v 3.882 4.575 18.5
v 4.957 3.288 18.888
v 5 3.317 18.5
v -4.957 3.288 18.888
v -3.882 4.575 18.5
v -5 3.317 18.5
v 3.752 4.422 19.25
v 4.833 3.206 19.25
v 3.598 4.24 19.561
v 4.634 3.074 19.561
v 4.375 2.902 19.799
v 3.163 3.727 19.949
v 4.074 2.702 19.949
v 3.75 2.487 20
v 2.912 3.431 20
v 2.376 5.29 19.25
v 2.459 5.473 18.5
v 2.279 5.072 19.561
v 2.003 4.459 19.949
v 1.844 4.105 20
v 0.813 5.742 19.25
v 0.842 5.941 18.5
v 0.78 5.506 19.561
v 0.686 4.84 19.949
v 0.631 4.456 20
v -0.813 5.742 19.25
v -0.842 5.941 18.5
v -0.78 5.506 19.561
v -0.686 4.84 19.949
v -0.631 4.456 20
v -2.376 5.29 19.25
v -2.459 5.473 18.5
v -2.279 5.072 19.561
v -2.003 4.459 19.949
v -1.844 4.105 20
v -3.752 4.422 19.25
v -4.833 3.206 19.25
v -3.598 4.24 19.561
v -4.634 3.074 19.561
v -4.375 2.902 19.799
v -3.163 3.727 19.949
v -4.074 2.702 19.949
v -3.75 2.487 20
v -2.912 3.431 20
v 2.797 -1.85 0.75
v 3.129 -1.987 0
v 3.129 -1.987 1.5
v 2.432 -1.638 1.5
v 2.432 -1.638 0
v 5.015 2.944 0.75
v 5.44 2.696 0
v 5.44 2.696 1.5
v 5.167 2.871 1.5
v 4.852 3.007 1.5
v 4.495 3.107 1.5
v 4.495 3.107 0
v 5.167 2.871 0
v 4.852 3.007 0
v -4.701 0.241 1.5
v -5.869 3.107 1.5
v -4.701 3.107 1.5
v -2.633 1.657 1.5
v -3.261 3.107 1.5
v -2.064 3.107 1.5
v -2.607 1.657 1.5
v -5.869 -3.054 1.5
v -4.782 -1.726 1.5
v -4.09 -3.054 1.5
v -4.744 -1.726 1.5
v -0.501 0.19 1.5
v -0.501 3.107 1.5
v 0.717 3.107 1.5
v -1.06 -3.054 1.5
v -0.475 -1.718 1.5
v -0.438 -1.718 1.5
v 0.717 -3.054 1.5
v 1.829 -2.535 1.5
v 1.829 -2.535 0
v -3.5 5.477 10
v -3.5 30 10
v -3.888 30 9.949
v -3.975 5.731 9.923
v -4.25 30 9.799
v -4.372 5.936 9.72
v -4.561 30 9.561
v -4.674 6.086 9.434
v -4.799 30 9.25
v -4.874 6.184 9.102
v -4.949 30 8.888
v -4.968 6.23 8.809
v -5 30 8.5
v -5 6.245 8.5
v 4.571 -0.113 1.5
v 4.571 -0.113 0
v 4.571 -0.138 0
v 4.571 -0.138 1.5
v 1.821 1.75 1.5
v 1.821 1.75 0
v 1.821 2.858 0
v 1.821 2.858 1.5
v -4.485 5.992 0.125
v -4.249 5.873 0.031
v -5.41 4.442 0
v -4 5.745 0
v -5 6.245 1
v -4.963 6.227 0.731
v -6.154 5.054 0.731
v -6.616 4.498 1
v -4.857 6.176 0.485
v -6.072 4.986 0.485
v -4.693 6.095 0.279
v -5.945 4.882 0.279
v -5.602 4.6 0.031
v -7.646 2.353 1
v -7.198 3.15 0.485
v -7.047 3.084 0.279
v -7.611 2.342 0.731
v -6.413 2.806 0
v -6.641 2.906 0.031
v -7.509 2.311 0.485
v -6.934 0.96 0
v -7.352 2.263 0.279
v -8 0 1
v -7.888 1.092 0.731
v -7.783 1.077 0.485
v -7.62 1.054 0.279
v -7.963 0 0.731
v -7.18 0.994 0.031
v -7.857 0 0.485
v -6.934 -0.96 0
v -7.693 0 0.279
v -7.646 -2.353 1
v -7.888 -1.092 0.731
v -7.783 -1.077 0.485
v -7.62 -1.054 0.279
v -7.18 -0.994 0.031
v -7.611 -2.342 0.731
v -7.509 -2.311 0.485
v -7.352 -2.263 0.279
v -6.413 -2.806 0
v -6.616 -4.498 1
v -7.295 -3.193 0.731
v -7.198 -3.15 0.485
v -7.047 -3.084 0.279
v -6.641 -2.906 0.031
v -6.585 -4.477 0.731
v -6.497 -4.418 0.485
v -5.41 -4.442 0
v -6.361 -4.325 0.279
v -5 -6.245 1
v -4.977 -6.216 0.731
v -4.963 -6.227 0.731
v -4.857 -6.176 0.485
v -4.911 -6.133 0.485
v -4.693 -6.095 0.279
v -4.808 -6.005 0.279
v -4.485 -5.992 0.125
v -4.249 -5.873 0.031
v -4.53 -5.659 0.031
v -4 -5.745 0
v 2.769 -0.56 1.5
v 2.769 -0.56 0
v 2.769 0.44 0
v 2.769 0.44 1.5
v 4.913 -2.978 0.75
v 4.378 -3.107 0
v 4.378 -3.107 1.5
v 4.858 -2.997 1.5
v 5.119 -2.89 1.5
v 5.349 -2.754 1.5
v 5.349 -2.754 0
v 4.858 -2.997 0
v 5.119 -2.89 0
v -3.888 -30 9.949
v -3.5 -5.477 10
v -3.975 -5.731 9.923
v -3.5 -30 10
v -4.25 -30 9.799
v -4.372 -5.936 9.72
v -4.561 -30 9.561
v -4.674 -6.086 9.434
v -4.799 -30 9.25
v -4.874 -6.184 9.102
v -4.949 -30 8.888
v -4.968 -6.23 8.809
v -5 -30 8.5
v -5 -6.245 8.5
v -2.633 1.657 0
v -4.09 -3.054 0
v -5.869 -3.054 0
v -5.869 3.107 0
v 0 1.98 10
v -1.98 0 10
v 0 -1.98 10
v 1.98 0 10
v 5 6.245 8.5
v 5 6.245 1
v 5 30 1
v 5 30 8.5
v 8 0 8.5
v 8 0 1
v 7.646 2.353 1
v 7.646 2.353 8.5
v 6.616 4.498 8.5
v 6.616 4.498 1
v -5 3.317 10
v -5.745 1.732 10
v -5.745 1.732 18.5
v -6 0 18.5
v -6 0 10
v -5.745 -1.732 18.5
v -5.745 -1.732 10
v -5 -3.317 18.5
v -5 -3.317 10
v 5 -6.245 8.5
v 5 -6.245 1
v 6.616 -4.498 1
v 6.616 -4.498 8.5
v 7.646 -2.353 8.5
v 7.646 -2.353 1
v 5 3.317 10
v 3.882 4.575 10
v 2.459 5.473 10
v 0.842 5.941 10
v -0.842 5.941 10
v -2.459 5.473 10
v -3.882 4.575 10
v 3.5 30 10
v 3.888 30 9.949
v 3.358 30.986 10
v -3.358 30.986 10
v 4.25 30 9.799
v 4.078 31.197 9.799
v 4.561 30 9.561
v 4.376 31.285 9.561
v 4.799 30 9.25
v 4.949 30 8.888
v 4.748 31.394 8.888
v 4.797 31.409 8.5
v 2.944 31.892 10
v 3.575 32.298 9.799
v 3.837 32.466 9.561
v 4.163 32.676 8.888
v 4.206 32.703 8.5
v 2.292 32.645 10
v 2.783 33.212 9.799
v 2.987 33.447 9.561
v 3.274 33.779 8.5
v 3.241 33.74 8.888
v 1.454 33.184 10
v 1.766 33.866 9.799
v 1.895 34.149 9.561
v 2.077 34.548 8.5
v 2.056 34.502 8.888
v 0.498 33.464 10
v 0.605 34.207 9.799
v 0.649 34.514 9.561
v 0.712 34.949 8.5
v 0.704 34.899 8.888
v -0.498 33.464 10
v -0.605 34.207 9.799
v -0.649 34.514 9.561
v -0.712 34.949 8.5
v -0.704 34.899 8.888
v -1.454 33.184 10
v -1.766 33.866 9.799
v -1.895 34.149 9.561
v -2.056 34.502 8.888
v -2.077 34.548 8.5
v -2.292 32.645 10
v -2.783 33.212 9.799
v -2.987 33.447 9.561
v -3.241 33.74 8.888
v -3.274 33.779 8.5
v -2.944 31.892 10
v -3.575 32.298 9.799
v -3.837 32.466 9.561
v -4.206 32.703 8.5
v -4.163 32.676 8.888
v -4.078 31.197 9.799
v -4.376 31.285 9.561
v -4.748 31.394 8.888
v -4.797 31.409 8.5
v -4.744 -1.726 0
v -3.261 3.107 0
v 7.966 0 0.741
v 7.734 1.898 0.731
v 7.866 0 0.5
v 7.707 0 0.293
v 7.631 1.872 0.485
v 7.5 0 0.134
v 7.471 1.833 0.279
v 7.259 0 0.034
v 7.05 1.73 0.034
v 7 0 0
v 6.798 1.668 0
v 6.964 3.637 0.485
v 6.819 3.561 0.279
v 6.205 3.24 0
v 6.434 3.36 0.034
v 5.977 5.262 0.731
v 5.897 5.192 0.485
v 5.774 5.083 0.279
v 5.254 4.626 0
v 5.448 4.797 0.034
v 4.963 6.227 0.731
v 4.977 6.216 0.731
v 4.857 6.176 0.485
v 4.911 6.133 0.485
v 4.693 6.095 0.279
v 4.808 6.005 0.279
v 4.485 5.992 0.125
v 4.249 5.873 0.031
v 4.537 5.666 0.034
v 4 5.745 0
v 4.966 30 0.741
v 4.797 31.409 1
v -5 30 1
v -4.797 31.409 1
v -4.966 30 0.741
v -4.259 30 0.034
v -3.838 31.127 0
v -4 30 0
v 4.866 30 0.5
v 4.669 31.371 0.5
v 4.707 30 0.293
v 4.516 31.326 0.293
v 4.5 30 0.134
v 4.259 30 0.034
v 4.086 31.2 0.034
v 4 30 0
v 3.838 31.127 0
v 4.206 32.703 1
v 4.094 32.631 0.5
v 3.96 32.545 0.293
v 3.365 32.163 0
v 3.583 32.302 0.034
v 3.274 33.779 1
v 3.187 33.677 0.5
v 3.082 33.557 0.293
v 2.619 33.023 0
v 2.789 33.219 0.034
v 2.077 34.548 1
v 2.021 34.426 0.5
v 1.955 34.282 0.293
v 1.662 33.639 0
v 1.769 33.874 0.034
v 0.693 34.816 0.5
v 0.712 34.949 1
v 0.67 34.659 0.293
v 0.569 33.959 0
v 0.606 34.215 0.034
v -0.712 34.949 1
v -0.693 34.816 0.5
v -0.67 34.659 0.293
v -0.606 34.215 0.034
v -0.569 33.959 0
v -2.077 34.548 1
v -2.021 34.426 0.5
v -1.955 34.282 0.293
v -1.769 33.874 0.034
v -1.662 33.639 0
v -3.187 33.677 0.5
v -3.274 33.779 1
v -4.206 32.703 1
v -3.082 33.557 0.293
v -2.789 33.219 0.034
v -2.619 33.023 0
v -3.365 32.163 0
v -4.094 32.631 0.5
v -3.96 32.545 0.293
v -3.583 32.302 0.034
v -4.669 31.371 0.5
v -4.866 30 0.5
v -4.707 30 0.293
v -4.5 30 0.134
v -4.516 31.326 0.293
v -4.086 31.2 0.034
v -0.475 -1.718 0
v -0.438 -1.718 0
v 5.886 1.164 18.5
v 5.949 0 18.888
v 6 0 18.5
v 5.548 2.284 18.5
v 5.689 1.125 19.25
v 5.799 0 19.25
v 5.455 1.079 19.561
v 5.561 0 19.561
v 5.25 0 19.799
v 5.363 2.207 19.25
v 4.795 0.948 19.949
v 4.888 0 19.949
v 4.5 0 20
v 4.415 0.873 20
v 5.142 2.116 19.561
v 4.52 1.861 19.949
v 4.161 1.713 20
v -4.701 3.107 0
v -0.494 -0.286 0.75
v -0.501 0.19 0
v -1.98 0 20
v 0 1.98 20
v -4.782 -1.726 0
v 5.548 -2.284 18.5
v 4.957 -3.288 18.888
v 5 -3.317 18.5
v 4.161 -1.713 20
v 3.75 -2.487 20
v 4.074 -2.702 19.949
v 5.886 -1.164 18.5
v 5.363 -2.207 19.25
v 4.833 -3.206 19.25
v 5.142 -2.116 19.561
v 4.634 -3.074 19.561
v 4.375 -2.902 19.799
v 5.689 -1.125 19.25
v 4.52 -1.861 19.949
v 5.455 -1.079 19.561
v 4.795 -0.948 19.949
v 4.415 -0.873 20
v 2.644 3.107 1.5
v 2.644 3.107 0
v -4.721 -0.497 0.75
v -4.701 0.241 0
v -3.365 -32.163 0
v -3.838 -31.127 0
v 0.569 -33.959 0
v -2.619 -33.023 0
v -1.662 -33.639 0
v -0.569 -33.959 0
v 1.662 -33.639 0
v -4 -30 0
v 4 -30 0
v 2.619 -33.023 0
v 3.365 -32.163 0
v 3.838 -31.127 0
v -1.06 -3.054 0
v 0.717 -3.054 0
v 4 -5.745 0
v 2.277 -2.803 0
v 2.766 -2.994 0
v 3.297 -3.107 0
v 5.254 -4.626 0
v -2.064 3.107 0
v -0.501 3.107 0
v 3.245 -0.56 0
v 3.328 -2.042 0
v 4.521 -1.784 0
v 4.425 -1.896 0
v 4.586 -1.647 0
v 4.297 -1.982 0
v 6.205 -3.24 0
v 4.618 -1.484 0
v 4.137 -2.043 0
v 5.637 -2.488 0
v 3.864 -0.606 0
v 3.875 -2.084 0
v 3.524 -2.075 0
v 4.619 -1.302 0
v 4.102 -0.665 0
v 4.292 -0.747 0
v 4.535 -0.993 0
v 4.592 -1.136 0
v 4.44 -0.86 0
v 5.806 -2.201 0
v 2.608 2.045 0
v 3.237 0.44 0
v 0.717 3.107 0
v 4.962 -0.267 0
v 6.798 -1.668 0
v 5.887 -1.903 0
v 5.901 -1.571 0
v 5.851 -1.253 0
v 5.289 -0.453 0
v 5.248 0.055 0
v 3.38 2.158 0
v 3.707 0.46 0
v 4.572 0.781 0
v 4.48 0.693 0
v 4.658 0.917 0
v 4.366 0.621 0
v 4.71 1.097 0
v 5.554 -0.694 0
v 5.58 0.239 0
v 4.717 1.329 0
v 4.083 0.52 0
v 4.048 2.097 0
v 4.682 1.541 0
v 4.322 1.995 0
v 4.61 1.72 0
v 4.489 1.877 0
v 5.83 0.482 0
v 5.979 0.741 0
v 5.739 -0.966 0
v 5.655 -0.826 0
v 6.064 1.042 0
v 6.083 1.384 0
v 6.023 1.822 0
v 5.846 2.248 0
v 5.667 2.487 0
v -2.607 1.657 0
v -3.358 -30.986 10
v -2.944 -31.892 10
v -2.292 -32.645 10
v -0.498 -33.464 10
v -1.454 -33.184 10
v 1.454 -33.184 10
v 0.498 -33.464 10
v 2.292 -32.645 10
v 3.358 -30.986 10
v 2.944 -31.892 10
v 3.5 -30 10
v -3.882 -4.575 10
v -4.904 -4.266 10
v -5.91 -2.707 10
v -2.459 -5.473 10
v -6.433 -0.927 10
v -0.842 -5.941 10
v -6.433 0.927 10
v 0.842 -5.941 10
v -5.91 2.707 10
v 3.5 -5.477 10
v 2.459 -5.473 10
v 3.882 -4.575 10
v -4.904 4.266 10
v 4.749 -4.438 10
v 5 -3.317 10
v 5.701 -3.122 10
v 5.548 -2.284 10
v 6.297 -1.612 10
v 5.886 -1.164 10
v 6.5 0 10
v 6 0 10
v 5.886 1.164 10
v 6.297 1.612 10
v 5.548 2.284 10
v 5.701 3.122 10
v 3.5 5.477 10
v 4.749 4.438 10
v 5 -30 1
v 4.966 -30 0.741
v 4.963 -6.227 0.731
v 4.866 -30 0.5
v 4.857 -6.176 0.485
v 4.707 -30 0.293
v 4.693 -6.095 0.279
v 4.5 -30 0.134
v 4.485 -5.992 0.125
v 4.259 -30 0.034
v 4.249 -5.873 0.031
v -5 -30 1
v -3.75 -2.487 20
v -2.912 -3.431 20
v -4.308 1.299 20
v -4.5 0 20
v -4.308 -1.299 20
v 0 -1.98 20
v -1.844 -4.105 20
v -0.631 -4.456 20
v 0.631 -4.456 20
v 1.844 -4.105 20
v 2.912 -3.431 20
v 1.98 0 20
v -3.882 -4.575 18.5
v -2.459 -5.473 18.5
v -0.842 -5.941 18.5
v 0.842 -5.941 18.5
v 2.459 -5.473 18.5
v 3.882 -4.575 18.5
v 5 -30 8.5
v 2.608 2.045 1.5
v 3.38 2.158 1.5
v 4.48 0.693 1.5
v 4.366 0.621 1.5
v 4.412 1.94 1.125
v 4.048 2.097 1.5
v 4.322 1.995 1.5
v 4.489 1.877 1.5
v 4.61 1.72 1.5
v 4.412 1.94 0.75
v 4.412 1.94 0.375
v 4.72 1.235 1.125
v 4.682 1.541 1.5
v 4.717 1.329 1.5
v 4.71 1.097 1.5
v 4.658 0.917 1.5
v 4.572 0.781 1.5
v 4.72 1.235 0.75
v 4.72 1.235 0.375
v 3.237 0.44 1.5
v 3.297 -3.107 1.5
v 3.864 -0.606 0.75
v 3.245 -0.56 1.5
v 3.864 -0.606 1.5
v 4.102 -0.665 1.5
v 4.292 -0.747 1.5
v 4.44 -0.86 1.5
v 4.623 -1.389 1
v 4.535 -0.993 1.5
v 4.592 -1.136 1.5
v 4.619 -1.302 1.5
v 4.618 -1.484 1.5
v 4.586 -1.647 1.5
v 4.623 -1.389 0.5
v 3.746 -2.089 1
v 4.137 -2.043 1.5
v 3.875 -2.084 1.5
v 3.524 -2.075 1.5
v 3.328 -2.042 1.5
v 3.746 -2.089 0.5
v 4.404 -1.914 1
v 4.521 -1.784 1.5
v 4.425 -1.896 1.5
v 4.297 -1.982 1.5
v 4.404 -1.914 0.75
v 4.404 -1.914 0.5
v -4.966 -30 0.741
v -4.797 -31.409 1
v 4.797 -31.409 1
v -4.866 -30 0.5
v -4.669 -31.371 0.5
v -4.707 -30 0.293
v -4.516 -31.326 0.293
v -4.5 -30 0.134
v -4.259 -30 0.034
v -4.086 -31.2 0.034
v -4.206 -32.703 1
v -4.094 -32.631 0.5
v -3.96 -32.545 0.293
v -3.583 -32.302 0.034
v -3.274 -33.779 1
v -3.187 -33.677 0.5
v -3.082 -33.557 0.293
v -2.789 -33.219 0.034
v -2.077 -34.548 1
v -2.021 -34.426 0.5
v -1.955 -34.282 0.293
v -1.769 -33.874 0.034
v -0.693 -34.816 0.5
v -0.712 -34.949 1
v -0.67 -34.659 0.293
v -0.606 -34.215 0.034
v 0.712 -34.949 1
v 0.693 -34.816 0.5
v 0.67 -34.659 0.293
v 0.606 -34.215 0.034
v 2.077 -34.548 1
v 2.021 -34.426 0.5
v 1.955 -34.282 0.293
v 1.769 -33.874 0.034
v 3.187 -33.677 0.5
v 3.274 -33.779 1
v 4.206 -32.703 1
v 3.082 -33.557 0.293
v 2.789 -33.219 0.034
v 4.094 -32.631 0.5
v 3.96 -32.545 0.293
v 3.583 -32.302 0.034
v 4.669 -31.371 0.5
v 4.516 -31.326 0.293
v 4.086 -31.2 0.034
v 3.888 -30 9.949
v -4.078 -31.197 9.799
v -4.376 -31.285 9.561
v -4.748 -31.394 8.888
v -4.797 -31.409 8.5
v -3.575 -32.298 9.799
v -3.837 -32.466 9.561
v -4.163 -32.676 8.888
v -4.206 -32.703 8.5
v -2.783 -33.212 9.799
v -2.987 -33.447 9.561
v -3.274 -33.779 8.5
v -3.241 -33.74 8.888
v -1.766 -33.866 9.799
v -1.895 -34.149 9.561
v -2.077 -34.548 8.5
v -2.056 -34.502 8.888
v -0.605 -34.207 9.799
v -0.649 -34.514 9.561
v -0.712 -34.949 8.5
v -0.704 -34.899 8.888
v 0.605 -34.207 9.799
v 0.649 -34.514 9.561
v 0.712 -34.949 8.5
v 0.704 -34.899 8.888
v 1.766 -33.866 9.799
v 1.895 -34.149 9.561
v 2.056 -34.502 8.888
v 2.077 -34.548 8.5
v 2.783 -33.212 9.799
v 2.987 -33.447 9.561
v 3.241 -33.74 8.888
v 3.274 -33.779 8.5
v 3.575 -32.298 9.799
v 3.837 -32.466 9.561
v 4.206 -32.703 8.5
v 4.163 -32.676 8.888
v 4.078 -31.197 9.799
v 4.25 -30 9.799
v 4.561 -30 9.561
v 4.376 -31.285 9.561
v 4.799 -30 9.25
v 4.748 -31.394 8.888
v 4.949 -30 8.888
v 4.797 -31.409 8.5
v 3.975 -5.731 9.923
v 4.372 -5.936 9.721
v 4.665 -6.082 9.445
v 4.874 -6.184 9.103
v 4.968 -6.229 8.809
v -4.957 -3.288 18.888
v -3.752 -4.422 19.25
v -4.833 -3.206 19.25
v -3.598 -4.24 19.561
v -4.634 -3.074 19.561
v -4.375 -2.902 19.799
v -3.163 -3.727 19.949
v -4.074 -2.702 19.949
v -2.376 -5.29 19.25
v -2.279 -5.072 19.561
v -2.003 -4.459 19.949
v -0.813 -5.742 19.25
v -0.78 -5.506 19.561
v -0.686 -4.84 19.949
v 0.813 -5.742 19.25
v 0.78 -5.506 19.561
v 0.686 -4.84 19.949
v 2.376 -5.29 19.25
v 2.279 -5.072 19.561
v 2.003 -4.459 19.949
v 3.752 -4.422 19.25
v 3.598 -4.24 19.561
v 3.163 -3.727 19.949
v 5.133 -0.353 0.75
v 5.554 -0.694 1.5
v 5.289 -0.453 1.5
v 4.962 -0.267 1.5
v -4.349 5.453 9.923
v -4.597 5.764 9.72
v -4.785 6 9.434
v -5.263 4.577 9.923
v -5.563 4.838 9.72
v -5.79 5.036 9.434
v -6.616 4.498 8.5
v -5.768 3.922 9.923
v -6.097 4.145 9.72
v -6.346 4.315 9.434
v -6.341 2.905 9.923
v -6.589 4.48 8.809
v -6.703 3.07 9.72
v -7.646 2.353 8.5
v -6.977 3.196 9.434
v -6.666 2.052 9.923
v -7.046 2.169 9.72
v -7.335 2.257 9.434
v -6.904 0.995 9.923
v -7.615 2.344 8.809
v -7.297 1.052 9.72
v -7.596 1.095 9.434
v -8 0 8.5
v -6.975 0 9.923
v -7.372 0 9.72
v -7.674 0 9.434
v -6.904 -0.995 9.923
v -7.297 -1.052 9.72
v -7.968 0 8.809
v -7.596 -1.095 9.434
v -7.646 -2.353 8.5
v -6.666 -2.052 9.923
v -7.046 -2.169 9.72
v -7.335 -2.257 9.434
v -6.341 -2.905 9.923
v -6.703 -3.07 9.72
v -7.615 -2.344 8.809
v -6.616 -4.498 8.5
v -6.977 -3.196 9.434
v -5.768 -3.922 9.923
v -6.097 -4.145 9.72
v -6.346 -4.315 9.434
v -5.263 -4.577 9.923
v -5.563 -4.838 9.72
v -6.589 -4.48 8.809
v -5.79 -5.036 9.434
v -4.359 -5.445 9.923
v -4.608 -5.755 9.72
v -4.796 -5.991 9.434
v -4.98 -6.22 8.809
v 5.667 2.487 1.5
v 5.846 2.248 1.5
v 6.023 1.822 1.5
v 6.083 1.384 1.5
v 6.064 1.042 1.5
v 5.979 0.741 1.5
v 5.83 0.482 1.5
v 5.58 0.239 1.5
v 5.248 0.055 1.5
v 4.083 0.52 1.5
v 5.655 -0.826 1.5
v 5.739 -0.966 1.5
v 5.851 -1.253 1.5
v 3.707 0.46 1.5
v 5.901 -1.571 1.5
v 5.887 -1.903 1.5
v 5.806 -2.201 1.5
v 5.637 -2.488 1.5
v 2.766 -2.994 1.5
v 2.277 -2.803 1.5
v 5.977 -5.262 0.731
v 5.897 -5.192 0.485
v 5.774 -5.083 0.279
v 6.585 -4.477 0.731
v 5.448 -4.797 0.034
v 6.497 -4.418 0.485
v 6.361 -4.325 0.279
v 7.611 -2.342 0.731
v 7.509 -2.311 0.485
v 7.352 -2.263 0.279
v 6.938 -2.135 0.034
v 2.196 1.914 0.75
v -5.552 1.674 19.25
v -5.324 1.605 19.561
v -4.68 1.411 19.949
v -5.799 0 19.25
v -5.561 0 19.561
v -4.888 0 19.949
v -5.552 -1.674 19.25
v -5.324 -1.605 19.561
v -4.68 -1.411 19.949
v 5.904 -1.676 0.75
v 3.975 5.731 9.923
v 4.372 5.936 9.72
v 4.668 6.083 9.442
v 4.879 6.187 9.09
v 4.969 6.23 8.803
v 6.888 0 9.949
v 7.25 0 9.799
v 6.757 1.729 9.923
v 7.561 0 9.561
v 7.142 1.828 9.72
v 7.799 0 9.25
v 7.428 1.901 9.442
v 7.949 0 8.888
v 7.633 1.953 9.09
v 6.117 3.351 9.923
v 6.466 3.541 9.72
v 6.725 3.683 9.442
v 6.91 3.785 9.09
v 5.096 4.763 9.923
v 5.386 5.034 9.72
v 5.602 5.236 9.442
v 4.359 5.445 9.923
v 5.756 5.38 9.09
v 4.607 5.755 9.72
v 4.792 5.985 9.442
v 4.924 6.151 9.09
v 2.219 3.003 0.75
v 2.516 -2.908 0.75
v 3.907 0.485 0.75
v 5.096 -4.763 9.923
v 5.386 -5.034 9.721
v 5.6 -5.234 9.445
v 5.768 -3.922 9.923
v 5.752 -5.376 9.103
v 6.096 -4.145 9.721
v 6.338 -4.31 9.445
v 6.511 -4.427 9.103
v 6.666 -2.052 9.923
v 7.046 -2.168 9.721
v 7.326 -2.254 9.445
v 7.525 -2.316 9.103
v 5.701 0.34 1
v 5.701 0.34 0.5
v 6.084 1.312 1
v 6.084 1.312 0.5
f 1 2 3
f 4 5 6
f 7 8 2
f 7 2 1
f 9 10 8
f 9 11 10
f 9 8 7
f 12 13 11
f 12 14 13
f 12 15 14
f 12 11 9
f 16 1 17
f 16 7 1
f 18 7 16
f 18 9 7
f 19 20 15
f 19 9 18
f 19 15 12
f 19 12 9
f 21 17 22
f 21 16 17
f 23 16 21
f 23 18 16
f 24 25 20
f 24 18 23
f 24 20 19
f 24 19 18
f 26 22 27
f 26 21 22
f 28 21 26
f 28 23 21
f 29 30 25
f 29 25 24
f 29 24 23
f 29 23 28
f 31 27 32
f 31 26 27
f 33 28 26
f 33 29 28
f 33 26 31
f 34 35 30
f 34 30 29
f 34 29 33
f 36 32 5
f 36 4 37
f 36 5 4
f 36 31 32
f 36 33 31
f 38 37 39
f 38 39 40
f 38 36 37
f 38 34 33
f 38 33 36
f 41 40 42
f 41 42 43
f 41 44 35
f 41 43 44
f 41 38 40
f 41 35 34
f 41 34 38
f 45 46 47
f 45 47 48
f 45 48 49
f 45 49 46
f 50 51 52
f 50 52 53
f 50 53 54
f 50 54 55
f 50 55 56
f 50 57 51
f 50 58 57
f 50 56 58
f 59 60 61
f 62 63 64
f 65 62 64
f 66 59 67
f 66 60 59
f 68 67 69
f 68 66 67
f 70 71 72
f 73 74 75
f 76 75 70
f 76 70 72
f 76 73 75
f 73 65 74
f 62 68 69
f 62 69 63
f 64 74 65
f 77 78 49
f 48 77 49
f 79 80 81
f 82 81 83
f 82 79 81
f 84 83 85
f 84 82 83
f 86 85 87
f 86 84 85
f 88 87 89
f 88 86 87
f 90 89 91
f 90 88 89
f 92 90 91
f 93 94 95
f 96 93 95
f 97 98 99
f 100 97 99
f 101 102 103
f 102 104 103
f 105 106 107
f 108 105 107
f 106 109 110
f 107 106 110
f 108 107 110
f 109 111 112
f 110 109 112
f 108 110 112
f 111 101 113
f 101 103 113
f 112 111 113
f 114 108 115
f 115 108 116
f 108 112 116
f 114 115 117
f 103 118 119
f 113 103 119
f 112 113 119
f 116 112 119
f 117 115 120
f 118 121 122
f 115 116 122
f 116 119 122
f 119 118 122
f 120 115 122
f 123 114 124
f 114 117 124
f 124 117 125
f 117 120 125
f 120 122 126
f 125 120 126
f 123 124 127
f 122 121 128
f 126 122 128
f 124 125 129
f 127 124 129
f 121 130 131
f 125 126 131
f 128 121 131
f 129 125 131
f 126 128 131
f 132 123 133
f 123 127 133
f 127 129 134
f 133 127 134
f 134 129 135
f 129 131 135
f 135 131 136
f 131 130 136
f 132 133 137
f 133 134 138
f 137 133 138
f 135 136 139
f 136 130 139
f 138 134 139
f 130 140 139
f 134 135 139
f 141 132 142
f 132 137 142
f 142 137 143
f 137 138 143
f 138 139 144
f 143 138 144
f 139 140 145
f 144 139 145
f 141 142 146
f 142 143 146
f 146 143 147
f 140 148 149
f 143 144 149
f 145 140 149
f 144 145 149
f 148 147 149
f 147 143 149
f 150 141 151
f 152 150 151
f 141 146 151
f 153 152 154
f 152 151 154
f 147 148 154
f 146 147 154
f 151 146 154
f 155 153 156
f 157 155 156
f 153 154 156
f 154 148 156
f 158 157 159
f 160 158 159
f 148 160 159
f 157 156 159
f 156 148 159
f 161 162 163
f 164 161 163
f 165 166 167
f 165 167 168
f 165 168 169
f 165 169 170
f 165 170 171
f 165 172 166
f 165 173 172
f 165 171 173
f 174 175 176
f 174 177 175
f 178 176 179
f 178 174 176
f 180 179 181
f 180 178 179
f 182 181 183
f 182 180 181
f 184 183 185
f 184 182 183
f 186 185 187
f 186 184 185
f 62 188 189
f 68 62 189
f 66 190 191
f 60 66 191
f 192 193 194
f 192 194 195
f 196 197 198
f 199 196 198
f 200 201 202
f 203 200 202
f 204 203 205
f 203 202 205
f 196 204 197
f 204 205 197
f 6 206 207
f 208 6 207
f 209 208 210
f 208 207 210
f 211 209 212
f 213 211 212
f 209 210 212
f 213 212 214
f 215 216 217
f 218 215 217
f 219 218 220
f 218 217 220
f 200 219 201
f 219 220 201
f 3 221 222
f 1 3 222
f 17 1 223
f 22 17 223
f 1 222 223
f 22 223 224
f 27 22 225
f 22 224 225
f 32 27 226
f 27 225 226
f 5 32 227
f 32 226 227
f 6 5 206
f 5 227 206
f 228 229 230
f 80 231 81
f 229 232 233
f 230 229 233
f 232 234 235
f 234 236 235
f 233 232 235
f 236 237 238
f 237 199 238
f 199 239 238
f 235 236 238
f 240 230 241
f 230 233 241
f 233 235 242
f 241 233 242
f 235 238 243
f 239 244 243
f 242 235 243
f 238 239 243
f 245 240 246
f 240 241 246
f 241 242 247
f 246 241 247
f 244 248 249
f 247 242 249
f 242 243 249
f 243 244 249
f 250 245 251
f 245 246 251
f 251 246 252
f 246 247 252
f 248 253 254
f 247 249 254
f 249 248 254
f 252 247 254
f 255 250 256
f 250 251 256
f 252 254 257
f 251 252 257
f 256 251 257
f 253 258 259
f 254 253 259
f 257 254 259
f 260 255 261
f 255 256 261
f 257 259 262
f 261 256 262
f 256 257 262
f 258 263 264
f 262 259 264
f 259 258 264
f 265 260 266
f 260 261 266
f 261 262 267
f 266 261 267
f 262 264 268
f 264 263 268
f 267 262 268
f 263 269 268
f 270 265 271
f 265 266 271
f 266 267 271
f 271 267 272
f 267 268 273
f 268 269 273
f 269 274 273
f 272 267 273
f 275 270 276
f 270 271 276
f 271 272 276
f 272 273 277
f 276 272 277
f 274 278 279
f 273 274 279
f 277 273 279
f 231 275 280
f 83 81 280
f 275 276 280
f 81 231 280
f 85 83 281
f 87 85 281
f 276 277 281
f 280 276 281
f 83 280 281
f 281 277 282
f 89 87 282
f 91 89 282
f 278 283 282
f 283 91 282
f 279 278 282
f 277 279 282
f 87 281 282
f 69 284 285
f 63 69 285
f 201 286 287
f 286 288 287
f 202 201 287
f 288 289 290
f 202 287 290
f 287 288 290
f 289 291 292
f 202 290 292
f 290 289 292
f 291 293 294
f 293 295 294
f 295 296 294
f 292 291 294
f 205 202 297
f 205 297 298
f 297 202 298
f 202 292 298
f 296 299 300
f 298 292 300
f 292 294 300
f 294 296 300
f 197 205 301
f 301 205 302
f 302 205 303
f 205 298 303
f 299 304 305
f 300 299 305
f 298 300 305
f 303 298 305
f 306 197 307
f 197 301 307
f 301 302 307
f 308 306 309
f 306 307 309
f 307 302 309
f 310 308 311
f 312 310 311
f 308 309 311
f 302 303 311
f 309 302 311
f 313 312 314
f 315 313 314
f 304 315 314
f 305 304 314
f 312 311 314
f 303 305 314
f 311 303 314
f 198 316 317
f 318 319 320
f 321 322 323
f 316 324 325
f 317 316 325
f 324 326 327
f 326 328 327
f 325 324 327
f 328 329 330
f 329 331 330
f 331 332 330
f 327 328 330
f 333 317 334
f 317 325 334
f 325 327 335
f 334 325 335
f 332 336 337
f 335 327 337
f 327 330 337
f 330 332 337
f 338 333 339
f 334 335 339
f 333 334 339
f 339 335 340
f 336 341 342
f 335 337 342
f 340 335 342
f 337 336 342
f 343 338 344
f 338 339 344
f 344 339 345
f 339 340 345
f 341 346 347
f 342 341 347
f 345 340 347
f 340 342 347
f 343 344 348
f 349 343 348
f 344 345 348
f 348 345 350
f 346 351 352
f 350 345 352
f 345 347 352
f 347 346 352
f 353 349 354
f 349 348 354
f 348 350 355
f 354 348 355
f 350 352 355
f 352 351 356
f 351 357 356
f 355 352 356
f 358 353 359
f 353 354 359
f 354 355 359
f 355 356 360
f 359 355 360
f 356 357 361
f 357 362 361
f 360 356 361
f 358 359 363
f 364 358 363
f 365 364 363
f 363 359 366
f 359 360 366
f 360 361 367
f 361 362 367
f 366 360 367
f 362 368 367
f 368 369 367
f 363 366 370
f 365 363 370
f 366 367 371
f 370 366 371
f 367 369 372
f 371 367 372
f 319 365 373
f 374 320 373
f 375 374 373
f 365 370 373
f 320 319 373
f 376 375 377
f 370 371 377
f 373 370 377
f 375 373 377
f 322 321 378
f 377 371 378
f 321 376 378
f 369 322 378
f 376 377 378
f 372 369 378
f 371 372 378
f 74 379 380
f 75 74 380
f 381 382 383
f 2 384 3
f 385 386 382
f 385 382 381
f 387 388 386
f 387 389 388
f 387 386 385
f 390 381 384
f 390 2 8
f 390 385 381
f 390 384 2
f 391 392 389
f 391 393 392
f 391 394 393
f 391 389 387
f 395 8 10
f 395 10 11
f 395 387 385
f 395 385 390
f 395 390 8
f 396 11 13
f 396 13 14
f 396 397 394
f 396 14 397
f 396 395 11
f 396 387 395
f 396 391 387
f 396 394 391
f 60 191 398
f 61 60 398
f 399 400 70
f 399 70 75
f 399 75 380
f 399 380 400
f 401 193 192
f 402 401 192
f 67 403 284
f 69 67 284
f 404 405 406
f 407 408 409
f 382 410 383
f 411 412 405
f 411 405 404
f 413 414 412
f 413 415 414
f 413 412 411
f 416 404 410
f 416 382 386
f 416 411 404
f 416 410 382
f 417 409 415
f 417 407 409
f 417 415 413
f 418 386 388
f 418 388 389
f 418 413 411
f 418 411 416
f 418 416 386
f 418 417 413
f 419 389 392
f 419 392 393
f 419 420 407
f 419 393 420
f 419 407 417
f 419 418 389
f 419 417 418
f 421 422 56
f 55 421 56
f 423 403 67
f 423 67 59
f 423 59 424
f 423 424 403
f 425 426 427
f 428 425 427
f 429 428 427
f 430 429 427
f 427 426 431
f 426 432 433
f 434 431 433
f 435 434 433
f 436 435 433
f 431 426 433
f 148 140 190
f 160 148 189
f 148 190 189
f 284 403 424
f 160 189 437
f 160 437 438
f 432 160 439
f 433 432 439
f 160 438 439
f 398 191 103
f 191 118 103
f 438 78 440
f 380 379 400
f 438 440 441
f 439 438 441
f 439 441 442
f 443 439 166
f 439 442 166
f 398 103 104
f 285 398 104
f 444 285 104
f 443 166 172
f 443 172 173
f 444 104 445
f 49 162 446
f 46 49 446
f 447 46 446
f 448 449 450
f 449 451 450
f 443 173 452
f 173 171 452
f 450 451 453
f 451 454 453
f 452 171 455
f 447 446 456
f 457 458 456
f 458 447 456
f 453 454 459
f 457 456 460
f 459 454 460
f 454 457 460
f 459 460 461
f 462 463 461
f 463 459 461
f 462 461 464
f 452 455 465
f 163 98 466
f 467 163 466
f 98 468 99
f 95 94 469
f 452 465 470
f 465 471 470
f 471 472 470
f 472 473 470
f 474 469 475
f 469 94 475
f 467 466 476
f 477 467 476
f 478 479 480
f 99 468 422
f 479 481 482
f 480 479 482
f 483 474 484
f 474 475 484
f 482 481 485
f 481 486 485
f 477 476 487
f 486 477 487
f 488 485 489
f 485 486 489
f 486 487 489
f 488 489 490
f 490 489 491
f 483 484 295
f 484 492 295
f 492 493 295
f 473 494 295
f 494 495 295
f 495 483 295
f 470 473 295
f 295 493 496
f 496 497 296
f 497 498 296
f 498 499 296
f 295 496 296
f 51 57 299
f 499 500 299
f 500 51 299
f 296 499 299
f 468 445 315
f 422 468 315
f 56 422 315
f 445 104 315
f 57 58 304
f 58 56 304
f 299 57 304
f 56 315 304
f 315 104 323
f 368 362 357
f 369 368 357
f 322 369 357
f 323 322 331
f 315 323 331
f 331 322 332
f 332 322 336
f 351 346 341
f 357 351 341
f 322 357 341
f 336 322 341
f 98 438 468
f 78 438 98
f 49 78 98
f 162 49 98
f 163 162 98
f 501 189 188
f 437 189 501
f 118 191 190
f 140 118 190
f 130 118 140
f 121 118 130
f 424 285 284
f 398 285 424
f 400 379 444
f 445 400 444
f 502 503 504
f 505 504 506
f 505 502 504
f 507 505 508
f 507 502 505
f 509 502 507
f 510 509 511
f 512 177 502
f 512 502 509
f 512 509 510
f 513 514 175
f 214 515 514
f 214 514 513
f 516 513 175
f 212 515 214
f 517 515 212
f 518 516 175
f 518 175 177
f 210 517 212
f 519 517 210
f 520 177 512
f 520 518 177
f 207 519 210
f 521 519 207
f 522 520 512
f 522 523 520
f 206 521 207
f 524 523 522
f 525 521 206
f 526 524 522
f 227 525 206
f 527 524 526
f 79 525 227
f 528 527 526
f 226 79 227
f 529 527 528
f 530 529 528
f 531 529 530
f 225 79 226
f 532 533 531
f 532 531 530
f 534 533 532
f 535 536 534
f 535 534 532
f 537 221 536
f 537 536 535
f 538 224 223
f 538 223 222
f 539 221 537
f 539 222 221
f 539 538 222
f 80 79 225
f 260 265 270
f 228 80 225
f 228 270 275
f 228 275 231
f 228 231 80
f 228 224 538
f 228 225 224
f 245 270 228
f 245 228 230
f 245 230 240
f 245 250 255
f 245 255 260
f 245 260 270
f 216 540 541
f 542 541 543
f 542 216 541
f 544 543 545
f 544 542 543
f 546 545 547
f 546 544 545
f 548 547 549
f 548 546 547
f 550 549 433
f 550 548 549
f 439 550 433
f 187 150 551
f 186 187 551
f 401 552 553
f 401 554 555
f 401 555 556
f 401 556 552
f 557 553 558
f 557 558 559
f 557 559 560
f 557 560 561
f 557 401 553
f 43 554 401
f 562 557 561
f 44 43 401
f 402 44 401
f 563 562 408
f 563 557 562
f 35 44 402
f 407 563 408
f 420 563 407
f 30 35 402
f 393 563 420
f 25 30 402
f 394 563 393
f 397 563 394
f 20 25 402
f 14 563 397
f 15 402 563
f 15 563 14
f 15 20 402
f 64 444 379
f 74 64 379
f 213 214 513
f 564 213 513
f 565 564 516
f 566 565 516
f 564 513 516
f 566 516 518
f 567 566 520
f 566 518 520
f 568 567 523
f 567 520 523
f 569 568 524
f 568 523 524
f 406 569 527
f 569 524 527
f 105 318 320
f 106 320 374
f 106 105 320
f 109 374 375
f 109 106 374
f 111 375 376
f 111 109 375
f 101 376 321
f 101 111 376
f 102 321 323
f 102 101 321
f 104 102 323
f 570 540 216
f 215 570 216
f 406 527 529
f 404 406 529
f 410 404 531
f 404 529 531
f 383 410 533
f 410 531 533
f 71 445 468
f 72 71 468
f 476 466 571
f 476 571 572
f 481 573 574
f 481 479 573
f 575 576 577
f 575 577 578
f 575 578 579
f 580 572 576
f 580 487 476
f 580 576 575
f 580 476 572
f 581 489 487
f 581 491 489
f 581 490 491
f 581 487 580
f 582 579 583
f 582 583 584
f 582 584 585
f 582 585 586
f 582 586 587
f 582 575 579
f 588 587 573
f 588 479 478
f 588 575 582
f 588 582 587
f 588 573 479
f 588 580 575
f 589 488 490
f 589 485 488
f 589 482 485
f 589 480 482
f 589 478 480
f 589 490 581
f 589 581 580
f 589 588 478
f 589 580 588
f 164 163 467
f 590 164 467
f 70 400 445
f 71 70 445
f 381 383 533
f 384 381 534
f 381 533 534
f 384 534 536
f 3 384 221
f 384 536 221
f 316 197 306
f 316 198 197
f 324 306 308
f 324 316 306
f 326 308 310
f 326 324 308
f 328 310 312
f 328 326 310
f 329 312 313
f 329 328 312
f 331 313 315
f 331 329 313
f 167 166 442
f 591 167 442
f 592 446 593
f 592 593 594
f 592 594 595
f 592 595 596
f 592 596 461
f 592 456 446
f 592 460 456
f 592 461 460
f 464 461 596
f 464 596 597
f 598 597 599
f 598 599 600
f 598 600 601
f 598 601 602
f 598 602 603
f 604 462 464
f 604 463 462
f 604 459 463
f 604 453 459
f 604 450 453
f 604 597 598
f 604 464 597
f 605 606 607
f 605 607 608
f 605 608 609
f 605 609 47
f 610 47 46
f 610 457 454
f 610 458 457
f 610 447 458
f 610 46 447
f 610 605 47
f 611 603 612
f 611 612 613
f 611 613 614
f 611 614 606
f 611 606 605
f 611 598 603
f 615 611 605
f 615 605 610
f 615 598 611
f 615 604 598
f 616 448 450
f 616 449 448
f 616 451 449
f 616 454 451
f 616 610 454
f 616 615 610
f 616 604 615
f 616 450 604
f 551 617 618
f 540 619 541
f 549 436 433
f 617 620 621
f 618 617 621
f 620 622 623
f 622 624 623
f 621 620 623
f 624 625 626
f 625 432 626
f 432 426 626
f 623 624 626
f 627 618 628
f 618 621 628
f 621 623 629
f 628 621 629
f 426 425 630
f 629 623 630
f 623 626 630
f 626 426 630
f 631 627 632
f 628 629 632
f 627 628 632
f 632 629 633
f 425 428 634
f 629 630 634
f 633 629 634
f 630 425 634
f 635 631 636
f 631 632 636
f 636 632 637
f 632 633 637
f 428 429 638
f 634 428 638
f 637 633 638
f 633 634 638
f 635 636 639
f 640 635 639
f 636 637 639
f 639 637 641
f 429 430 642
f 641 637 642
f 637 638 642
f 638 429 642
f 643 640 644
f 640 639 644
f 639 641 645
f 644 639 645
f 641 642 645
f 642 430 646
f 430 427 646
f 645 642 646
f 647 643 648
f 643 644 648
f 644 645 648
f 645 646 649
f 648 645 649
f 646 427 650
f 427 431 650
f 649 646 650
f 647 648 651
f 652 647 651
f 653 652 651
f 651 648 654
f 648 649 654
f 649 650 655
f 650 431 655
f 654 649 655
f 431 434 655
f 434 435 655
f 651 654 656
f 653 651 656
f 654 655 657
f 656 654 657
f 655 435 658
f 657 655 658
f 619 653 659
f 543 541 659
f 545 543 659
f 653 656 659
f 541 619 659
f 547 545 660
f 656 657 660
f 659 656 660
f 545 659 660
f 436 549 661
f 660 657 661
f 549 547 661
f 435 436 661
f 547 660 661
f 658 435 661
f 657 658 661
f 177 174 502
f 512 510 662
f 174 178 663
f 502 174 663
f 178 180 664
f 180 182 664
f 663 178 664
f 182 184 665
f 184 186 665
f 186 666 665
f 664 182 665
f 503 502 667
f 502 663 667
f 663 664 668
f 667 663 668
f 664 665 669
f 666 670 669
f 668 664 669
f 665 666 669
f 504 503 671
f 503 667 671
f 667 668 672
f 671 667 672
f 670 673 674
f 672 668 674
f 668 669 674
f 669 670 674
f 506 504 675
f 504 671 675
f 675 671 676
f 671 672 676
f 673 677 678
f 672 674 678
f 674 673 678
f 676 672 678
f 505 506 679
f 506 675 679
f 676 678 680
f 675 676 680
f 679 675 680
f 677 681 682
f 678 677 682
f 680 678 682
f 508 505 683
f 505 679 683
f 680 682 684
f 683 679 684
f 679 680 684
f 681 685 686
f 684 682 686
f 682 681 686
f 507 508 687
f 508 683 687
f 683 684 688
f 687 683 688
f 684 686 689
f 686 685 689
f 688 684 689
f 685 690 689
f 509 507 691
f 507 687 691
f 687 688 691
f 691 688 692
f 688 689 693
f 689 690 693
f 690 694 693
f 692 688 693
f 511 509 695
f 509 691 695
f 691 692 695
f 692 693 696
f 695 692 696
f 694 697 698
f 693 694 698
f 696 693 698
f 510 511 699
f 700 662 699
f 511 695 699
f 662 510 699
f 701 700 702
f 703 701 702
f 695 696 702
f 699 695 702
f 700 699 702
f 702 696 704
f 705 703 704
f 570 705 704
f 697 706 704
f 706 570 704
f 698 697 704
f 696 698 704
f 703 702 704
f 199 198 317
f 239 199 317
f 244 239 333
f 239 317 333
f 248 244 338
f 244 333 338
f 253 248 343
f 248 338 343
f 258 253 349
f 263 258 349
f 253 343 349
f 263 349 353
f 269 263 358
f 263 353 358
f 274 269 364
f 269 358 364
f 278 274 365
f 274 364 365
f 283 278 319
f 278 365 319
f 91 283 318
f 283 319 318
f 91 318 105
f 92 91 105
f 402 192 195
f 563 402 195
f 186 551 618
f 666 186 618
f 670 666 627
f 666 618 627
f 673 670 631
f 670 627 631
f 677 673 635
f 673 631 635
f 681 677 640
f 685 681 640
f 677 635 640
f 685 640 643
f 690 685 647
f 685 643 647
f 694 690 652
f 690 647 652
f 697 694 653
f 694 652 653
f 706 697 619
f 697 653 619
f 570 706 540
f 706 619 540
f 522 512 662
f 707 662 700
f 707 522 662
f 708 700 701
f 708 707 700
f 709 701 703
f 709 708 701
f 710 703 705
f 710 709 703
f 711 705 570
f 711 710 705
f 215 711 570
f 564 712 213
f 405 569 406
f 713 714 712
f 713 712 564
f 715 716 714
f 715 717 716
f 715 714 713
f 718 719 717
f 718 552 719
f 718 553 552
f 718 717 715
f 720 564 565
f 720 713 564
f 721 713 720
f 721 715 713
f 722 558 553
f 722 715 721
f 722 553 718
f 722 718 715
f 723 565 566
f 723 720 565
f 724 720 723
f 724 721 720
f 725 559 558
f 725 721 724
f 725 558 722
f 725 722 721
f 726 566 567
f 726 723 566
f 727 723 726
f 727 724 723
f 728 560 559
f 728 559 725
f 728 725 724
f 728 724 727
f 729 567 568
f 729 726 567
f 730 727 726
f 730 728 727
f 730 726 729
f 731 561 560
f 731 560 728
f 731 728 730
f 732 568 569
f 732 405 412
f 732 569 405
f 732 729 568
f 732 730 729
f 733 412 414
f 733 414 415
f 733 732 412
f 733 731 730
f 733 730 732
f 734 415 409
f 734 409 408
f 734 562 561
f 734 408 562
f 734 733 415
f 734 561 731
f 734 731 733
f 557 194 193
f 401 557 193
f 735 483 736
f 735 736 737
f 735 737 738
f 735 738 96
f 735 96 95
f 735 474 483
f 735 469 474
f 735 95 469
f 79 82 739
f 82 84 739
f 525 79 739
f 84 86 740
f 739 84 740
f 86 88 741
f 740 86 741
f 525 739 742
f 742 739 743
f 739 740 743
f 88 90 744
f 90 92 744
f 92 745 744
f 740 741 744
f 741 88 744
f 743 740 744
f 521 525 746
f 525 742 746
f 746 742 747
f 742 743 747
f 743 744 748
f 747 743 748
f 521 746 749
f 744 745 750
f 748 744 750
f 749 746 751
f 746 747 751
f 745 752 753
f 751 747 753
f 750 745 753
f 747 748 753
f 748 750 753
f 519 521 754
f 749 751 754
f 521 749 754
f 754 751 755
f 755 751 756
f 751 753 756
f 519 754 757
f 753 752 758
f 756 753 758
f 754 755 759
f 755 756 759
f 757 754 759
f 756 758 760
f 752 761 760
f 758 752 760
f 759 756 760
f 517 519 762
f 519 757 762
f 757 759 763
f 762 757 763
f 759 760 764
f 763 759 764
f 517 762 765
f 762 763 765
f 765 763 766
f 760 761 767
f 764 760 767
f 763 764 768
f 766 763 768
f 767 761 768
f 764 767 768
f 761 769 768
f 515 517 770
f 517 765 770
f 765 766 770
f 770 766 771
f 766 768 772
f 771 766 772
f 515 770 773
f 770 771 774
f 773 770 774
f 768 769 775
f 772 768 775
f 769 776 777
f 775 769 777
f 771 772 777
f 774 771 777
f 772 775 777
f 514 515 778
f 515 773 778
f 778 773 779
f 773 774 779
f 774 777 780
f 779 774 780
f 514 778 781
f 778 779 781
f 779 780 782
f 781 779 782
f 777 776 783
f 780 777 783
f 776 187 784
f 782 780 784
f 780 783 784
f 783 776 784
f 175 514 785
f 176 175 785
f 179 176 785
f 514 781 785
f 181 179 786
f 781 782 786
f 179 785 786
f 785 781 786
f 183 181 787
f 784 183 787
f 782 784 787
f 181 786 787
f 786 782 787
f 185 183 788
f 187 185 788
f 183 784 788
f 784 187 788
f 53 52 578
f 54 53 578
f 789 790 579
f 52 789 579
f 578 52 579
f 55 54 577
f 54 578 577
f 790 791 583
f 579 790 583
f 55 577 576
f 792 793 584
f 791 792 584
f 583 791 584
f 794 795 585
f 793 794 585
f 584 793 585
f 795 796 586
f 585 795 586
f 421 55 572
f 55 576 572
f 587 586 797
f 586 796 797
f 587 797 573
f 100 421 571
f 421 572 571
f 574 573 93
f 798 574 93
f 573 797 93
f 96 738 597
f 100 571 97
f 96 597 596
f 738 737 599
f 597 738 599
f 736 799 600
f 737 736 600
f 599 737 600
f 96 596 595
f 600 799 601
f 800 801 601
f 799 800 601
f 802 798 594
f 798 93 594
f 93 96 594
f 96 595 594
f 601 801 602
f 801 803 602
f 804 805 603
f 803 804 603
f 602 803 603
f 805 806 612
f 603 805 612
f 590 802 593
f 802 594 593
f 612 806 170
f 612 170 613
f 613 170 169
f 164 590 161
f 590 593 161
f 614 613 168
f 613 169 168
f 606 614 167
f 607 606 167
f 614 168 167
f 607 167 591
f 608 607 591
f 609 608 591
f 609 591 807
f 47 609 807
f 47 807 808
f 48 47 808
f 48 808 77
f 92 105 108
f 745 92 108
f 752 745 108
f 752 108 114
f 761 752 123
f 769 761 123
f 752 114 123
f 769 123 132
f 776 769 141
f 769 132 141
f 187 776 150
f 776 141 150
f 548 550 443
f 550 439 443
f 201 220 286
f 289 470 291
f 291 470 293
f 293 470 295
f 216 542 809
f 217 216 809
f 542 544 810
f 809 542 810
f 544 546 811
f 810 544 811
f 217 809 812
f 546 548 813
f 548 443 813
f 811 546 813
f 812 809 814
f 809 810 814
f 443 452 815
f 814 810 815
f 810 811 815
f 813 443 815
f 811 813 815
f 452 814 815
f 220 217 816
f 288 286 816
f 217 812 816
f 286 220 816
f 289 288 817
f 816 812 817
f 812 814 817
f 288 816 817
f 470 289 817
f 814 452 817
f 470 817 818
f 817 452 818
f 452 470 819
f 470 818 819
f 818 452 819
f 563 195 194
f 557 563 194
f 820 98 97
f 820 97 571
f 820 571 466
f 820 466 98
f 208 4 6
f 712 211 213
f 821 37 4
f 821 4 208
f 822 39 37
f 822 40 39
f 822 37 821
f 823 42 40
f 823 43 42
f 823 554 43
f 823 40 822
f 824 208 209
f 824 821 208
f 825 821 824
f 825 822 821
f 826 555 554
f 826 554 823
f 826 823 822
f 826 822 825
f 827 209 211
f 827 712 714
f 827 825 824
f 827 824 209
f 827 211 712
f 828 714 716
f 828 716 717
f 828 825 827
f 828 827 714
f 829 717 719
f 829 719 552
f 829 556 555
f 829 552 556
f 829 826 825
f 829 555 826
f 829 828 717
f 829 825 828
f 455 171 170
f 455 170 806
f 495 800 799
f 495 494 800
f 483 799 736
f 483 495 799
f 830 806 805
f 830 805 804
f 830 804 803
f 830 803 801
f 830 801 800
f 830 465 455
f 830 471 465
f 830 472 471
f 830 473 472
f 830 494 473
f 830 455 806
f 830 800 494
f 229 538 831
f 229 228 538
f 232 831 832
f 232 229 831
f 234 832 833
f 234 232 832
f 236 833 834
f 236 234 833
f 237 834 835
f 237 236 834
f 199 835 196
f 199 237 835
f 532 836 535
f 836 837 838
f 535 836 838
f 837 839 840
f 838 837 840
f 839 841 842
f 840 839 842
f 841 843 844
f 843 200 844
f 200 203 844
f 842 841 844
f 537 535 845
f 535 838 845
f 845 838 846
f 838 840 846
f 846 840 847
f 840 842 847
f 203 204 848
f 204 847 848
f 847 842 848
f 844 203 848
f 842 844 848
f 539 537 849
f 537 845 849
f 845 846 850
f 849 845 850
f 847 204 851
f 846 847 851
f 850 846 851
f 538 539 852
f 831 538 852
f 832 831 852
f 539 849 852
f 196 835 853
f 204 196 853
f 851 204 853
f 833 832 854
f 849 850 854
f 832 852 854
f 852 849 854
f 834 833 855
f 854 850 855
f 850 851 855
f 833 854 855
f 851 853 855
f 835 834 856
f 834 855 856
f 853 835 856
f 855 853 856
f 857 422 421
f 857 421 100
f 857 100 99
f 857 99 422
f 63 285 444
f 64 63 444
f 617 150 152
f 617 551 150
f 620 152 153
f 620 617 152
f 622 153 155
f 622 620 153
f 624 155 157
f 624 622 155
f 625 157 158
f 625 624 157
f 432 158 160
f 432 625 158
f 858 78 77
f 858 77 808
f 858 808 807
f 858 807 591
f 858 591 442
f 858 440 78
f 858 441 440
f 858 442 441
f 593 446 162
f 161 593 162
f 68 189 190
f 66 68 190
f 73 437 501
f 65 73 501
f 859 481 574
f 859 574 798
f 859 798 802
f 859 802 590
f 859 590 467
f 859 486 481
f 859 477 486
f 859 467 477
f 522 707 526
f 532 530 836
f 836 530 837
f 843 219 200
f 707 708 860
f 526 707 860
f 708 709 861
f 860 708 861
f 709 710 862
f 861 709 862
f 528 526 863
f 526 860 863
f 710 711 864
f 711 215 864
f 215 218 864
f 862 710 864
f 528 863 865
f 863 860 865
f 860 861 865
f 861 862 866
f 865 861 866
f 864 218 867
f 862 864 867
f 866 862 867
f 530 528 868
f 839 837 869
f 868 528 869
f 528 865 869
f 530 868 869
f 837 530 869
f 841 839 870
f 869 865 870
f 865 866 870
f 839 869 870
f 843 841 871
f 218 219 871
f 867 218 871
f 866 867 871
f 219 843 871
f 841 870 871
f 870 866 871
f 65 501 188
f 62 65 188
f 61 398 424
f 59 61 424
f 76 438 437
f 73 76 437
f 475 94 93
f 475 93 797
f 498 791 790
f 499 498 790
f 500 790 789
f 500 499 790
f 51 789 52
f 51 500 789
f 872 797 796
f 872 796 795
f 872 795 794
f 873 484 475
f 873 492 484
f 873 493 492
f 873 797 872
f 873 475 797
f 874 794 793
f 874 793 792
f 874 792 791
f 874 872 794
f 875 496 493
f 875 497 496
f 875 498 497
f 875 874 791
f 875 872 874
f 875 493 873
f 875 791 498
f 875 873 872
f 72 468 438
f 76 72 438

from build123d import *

# Parameters (mm, degrees)
F1_DEPTH  = 20
F2_DEPTH  = 10
F3_R      = 3.5197597043
F4_DEPTH  = 10
F6_DEPTH  = 1.5
F7_R      = 1.5
F8_R      = 1.5
F9_R      = 1
F11_DEPTH = 10


with BuildPart() as f1:
    # F0 (on Top) → F1 (new body)
    with BuildSketch(Plane.XY):
        with BuildLine():
            ThreePointArc((-5, -3.3166247904), (0, -6), (5, -3.3166247904))
            Line((5, -3.3166247904), (5, 3.3166247904))
            ThreePointArc((5, 3.3166247904), (0, 6), (-5, 3.3166247904))
            Line((-5, 3.3166247904), (-5, -3.3166247904))
        make_face()
        Polygon((2.8284271247, 0), (0, -2.8284271247), (-2.8284271247, 0), (0, 2.8284271247), align=None, mode=Mode.SUBTRACT)
        with BuildLine():
            Line((5, 3.3166247904), (5, -3.3166247904))
            ThreePointArc((5, -3.3166247904), (5.7445626465, -1.7320508076), (6, 0))
            ThreePointArc((6, 0), (5.7445626465, 1.7320508076), (5, 3.3166247904))
        make_face()
        with BuildLine():
            ThreePointArc((-5, 3.3166247904), (-6, 0), (-5, -3.3166247904))
            Line((-5, -3.3166247904), (-5, 3.3166247904))
        make_face()
    extrude(amount=F1_DEPTH)

    # F0 (on Top) → F2 (join)
    with BuildSketch(Plane.XY):
        with BuildLine():
            ThreePointArc((-5, -30), (0, -35), (5, -30))
            Line((5, -30), (-5, -30))
        make_face()
        with BuildLine():
            Line((-5, -30), (5, -30))
            Line((5, -30), (5, -6.2449979984))
            ThreePointArc((5, -6.2449979984), (0, -8), (-5, -6.2449979984))
            Line((-5, -6.2449979984), (-5, -30))
        make_face()
        with BuildLine():
            ThreePointArc((-5, -6.2449979984), (0, -8), (5, -6.2449979984))
            Line((5, -6.2449979984), (5, -3.3166247904))
            ThreePointArc((5, -3.3166247904), (0, -6), (-5, -3.3166247904))
            Line((-5, -3.3166247904), (-5, -6.2449979984))
        make_face()
        with BuildLine():
            Line((5, -3.3166247904), (5, -6.2449979984))
            ThreePointArc((5, -6.2449979984), (7.2111025509, -3.4641016151), (8, 0))
            ThreePointArc((8, 0), (7.2111025509, 3.4641016151), (5, 6.2449979984))
            Line((5, 6.2449979984), (5, 3.3166247904))
            ThreePointArc((5, 3.3166247904), (5.7445626465, 1.7320508076), (6, 0))
            ThreePointArc((6, 0), (5.7445626465, -1.7320508076), (5, -3.3166247904))
        make_face()
        with BuildLine():
            ThreePointArc((-5, 6.2449979984), (-8, 0), (-5, -6.2449979984))
            Line((-5, -6.2449979984), (-5, -3.3166247904))
            ThreePointArc((-5, -3.3166247904), (-6, 0), (-5, 3.3166247904))
            Line((-5, 3.3166247904), (-5, 6.2449979984))
        make_face()
        with BuildLine():
            ThreePointArc((5, 6.2449979984), (0, 8), (-5, 6.2449979984))
            Line((-5, 6.2449979984), (-5, 3.3166247904))
            ThreePointArc((-5, 3.3166247904), (0, 6), (5, 3.3166247904))
            Line((5, 3.3166247904), (5, 6.2449979984))
        make_face()
        with BuildLine():
            Line((-5, 30), (-5, 6.2449979984))
            ThreePointArc((-5, 6.2449979984), (0, 8), (5, 6.2449979984))
            Line((5, 6.2449979984), (5, 30))
            Line((5, 30), (-5, 30))
        make_face()
        with BuildLine():
            ThreePointArc((5, 30), (0, 35), (-5, 30))
            Line((-5, 30), (5, 30))
        make_face()
    extrude(amount=F2_DEPTH)

    # F3 (on Top) → F4 (join)
    with BuildSketch(Plane.XY):
        Circle(F3_R)
    extrude(amount=F4_DEPTH)

    # F5 (on face) → F6 (cut)
    with BuildSketch(Plane(origin=(0, 0, 0), x_dir=(1, 0, 0), z_dir=(0, 0, -1))):
        with BuildLine():
            add(Edge.make_bspline(
                [(2.6441919756, -3.1065111855), (2.204631474, -3.0232613545), (1.8208955538, -2.8584217506)],
                knots=[0.5050353738, 0.5050353738, 0.5050353738, 1, 1, 1], degree=2))
            Line((2.6441919756, -3.1065111855), (4.4951263987, -3.1065111855))
            add(Edge.make_bspline(
                [(5.439765355, -2.6959501369), (5.0621176878, -2.9862964082), (4.4951263987, -3.1065111855)],
                knots=[0, 0, 0, 0.5859606644, 0.5859606644, 0.5859606644], degree=2))
            add(Edge.make_bspline(
                [(6.084258561, -1.3119077185), (6.084258561, -2.2004454231), (5.439765355, -2.6959501369)],
                knots=[0, 0, 0, 1, 1, 1], degree=2))
            add(Edge.make_bspline(
                [(5.7013379114, -0.340448817), (6.084258561, -0.7011223162), (6.084258561, -1.3119077185)],
                knots=[0, 0, 0, 1, 1, 1], degree=2))
            add(Edge.make_bspline(
                [(4.5714523327, 0.1132582203), (5.3184172618, 0.0202246822), (5.7013379114, -0.340448817)],
                knots=[0, 0, 0, 1, 1, 1], degree=2))
            Line((4.5714523327, 0.1132582203), (4.5714523327, 0.1375278389))
            add(Edge.make_bspline(
                [(5.5536977314, 0.6943807554), (5.2038107294, 0.2898871115), (4.5714523327, 0.1375278389)],
                knots=[0, 0, 0, 1, 1, 1], degree=2))
            add(Edge.make_bspline(
                [(5.9035847334, 1.6759519981), (5.9035847334, 1.0988743994), (5.5536977314, 0.6943807554)],
                knots=[0, 0, 0, 1, 1, 1], degree=2))
            add(Edge.make_bspline(
                [(5.3494284412, 2.7539275592), (5.9035847334, 2.3662878171), (5.9035847334, 1.6759519981)],
                knots=[0, 0, 0, 1, 1, 1], degree=2))
            add(Edge.make_bspline(
                [(4.3779381685, 3.1065111855), (4.9619201154, 3.0249948188), (5.3494284412, 2.7539275592)],
                knots=[0.3007237646, 0.3007237646, 0.3007237646, 1, 1, 1], degree=2))
            Line((4.3779381685, 3.1065111855), (3.2967626907, 3.1065111855))
            add(Edge.make_bspline(
                [(1.8289854267, 2.5348268354), (2.4691218275, 2.9957250439), (3.2967626907, 3.1065111855)],
                knots=[0, 0, 0, 0.759629915, 0.759629915, 0.759629915], degree=2))
            Line((1.8289854267, 2.5348268354), (2.4316809562, 1.638199258))
            add(Edge.make_bspline(
                [(3.1287583359, 1.9874121039), (2.8146016058, 1.8862886929), (2.4316809562, 1.638199258)],
                knots=[0, 0, 0, 1, 1, 1], degree=2))
            add(Edge.make_bspline(
                [(3.746285299, 2.0885355149), (3.4429150661, 2.0885355149), (3.1287583359, 1.9874121039)],
                knots=[0, 0, 0, 1, 1, 1], degree=2))
            add(Edge.make_bspline(
                [(4.6226881942, 1.3887615109), (4.6226881942, 2.0885355149), (3.746285299, 2.0885355149)],
                knots=[0, 0, 0, 1, 1, 1], degree=2))
            add(Edge.make_bspline(
                [(4.2916775623, 0.7469649292), (4.6226881942, 0.9343803175), (4.6226881942, 1.3887615109)],
                knots=[0, 0, 0, 1, 1, 1], degree=2))
            add(Edge.make_bspline(
                [(3.2447131805, 0.5595495408), (3.9606669303, 0.5595495408), (4.2916775623, 0.7469649292)],
                knots=[0, 0, 0, 1, 1, 1], degree=2))
            Line((3.2447131805, 0.5595495408), (2.7687589928, 0.5595495408))
            Line((2.7687589928, 0.5595495408), (2.7687589928, -0.4395497598))
            Line((2.7687589928, -0.4395497598), (3.2366233076, -0.4395497598))
            add(Edge.make_bspline(
                [(4.3658347303, -0.6208977435), (4.0119027919, -0.4395497598), (3.2366233076, -0.4395497598)],
                knots=[0, 0, 0, 1, 1, 1], degree=2))
            add(Edge.make_bspline(
                [(4.7197666688, -1.2350539262), (4.7197666688, -0.8022457272), (4.3658347303, -0.6208977435)],
                knots=[0, 0, 0, 1, 1, 1], degree=2))
            add(Edge.make_bspline(
                [(4.4123514994, -1.9395470227), (4.7197666688, -1.7204462989), (4.7197666688, -1.2350539262)],
                knots=[0, 0, 0, 1, 1, 1], degree=2))
            add(Edge.make_bspline(
                [(3.4590948118, -2.1586477465), (4.10493633, -2.1586477465), (4.4123514994, -1.9395470227)],
                knots=[0, 0, 0, 1, 1, 1], degree=2))
            add(Edge.make_bspline(
                [(2.6083098474, -2.0447153702), (3.0384214221, -2.1586477465), (3.4590948118, -2.1586477465)],
                knots=[0, 0, 0, 1, 1, 1], degree=2))
            add(Edge.make_bspline(
                [(1.8208955538, -1.7501091661), (2.1781982727, -1.9307829938), (2.6083098474, -2.0447153702)],
                knots=[0, 0, 0, 1, 1, 1], degree=2))
            Line((1.8208955538, -1.7501091661), (1.8208955538, -2.8584217506))
        make_face()
        with BuildLine():
            Line((-0.5008979624, -3.1065111855), (0.7166279059, -3.1065111855))
            Line((0.7166279059, -3.1065111855), (0.7166279059, 3.0539270118))
            Line((0.7166279059, 3.0539270118), (-1.0604475032, 3.0539270118))
            Line((-1.0604475032, 3.0539270118), (-2.6069615352, -1.657075628))
            Line((-2.6069615352, -1.657075628), (-2.632579466, -1.657075628))
            Line((-2.632579466, -1.657075628), (-4.0901048964, 3.0539270118))
            Line((-4.0901048964, 3.0539270118), (-5.8685286176, 3.0539270118))
            Line((-5.8685286176, 3.0539270118), (-5.8685286176, -3.1065111855))
            Line((-5.8685286176, -3.1065111855), (-4.7008902987, -3.1065111855))
            Line((-4.7008902987, -3.1065111855), (-4.7008902987, -0.2413478742))
            add(Edge.make_bspline(
                [(-4.7817890275, 1.7258395475), (-4.7008902987, 0.2521343714), (-4.7008902987, -0.2413478742)],
                knots=[0, 0, 0, 1, 1, 1], degree=2))
            Line((-4.7817890275, 1.7258395475), (-4.7440362874, 1.7258395475))
            Line((-4.7440362874, 1.7258395475), (-3.2608929263, -3.1065111855))
            Line((-3.2608929263, -3.1065111855), (-2.0635917402, -3.1065111855))
            Line((-2.0635917402, -3.1065111855), (-0.4752800316, 1.7177496746))
            Line((-0.4752800316, 1.7177496746), (-0.4375272915, 1.7177496746))
            add(Edge.make_bspline(
                [(-0.4941564017, 0.2858421751), (-0.487414841, 0.5555046044), (-0.4375272915, 1.7177496746)],
                knots=[0, 0, 0, 1, 1, 1], degree=2))
            add(Edge.make_bspline(
                [(-0.5008979624, -0.1901120127), (-0.5008979624, 0.0161797458), (-0.4941564017, 0.2858421751)],
                knots=[0, 0, 0, 1, 1, 1], degree=2))
            Line((-0.5008979624, -0.1901120127), (-0.5008979624, -3.1065111855))
        make_face()
    extrude(amount=-F6_DEPTH, mode=Mode.SUBTRACT)

    # F7
    f7_edges = [f1.edges().sort_by_distance(p)[0] for p in [
        (5, -3.316625, 20),
    ]]
    fillet(f7_edges, radius=F7_R)

    # F8
    f8_edges = [f1.edges().sort_by_distance(p)[0] for p in [
        (0, -35, 10),
        (-5, -18.122499, 10),
        (-8, 0, 10),
        (-5, 18.122499, 10),
        (0, 35, 10),
        (5, 18.122499, 10),
        (8, 0, 10),
        (5, -18.122499, 10),
    ]]
    fillet(f8_edges, radius=F8_R)

    # F9
    f9_edges = [f1.edges().sort_by_distance(p)[0] for p in [
        (5, -18.122499, 0),
        (0, -35, 0),
        (-8, 0, 0),
        (-5, -18.122499, 0),
        (5, 18.122499, 0),
        (-5, 18.122499, 0),
        (0, 35, 0),
        (8, 0, 0),
    ]]
    fillet(f9_edges, radius=F9_R)

    # F10 (on face) → F11 (join)
    with BuildSketch(Plane.XY.offset(10)):
        Polygon((2.8284271247, 0), (0, 2.8284271247), (-2.8284271247, 0), (0, -2.8284271247), align=None)
        Polygon((-1.9798989873, 0), (0, 1.9798989873), (1.9798989873, 0), (0, -1.9798989873), align=None, mode=Mode.SUBTRACT)
    extrude(amount=F11_DEPTH)


solid = f1.part
